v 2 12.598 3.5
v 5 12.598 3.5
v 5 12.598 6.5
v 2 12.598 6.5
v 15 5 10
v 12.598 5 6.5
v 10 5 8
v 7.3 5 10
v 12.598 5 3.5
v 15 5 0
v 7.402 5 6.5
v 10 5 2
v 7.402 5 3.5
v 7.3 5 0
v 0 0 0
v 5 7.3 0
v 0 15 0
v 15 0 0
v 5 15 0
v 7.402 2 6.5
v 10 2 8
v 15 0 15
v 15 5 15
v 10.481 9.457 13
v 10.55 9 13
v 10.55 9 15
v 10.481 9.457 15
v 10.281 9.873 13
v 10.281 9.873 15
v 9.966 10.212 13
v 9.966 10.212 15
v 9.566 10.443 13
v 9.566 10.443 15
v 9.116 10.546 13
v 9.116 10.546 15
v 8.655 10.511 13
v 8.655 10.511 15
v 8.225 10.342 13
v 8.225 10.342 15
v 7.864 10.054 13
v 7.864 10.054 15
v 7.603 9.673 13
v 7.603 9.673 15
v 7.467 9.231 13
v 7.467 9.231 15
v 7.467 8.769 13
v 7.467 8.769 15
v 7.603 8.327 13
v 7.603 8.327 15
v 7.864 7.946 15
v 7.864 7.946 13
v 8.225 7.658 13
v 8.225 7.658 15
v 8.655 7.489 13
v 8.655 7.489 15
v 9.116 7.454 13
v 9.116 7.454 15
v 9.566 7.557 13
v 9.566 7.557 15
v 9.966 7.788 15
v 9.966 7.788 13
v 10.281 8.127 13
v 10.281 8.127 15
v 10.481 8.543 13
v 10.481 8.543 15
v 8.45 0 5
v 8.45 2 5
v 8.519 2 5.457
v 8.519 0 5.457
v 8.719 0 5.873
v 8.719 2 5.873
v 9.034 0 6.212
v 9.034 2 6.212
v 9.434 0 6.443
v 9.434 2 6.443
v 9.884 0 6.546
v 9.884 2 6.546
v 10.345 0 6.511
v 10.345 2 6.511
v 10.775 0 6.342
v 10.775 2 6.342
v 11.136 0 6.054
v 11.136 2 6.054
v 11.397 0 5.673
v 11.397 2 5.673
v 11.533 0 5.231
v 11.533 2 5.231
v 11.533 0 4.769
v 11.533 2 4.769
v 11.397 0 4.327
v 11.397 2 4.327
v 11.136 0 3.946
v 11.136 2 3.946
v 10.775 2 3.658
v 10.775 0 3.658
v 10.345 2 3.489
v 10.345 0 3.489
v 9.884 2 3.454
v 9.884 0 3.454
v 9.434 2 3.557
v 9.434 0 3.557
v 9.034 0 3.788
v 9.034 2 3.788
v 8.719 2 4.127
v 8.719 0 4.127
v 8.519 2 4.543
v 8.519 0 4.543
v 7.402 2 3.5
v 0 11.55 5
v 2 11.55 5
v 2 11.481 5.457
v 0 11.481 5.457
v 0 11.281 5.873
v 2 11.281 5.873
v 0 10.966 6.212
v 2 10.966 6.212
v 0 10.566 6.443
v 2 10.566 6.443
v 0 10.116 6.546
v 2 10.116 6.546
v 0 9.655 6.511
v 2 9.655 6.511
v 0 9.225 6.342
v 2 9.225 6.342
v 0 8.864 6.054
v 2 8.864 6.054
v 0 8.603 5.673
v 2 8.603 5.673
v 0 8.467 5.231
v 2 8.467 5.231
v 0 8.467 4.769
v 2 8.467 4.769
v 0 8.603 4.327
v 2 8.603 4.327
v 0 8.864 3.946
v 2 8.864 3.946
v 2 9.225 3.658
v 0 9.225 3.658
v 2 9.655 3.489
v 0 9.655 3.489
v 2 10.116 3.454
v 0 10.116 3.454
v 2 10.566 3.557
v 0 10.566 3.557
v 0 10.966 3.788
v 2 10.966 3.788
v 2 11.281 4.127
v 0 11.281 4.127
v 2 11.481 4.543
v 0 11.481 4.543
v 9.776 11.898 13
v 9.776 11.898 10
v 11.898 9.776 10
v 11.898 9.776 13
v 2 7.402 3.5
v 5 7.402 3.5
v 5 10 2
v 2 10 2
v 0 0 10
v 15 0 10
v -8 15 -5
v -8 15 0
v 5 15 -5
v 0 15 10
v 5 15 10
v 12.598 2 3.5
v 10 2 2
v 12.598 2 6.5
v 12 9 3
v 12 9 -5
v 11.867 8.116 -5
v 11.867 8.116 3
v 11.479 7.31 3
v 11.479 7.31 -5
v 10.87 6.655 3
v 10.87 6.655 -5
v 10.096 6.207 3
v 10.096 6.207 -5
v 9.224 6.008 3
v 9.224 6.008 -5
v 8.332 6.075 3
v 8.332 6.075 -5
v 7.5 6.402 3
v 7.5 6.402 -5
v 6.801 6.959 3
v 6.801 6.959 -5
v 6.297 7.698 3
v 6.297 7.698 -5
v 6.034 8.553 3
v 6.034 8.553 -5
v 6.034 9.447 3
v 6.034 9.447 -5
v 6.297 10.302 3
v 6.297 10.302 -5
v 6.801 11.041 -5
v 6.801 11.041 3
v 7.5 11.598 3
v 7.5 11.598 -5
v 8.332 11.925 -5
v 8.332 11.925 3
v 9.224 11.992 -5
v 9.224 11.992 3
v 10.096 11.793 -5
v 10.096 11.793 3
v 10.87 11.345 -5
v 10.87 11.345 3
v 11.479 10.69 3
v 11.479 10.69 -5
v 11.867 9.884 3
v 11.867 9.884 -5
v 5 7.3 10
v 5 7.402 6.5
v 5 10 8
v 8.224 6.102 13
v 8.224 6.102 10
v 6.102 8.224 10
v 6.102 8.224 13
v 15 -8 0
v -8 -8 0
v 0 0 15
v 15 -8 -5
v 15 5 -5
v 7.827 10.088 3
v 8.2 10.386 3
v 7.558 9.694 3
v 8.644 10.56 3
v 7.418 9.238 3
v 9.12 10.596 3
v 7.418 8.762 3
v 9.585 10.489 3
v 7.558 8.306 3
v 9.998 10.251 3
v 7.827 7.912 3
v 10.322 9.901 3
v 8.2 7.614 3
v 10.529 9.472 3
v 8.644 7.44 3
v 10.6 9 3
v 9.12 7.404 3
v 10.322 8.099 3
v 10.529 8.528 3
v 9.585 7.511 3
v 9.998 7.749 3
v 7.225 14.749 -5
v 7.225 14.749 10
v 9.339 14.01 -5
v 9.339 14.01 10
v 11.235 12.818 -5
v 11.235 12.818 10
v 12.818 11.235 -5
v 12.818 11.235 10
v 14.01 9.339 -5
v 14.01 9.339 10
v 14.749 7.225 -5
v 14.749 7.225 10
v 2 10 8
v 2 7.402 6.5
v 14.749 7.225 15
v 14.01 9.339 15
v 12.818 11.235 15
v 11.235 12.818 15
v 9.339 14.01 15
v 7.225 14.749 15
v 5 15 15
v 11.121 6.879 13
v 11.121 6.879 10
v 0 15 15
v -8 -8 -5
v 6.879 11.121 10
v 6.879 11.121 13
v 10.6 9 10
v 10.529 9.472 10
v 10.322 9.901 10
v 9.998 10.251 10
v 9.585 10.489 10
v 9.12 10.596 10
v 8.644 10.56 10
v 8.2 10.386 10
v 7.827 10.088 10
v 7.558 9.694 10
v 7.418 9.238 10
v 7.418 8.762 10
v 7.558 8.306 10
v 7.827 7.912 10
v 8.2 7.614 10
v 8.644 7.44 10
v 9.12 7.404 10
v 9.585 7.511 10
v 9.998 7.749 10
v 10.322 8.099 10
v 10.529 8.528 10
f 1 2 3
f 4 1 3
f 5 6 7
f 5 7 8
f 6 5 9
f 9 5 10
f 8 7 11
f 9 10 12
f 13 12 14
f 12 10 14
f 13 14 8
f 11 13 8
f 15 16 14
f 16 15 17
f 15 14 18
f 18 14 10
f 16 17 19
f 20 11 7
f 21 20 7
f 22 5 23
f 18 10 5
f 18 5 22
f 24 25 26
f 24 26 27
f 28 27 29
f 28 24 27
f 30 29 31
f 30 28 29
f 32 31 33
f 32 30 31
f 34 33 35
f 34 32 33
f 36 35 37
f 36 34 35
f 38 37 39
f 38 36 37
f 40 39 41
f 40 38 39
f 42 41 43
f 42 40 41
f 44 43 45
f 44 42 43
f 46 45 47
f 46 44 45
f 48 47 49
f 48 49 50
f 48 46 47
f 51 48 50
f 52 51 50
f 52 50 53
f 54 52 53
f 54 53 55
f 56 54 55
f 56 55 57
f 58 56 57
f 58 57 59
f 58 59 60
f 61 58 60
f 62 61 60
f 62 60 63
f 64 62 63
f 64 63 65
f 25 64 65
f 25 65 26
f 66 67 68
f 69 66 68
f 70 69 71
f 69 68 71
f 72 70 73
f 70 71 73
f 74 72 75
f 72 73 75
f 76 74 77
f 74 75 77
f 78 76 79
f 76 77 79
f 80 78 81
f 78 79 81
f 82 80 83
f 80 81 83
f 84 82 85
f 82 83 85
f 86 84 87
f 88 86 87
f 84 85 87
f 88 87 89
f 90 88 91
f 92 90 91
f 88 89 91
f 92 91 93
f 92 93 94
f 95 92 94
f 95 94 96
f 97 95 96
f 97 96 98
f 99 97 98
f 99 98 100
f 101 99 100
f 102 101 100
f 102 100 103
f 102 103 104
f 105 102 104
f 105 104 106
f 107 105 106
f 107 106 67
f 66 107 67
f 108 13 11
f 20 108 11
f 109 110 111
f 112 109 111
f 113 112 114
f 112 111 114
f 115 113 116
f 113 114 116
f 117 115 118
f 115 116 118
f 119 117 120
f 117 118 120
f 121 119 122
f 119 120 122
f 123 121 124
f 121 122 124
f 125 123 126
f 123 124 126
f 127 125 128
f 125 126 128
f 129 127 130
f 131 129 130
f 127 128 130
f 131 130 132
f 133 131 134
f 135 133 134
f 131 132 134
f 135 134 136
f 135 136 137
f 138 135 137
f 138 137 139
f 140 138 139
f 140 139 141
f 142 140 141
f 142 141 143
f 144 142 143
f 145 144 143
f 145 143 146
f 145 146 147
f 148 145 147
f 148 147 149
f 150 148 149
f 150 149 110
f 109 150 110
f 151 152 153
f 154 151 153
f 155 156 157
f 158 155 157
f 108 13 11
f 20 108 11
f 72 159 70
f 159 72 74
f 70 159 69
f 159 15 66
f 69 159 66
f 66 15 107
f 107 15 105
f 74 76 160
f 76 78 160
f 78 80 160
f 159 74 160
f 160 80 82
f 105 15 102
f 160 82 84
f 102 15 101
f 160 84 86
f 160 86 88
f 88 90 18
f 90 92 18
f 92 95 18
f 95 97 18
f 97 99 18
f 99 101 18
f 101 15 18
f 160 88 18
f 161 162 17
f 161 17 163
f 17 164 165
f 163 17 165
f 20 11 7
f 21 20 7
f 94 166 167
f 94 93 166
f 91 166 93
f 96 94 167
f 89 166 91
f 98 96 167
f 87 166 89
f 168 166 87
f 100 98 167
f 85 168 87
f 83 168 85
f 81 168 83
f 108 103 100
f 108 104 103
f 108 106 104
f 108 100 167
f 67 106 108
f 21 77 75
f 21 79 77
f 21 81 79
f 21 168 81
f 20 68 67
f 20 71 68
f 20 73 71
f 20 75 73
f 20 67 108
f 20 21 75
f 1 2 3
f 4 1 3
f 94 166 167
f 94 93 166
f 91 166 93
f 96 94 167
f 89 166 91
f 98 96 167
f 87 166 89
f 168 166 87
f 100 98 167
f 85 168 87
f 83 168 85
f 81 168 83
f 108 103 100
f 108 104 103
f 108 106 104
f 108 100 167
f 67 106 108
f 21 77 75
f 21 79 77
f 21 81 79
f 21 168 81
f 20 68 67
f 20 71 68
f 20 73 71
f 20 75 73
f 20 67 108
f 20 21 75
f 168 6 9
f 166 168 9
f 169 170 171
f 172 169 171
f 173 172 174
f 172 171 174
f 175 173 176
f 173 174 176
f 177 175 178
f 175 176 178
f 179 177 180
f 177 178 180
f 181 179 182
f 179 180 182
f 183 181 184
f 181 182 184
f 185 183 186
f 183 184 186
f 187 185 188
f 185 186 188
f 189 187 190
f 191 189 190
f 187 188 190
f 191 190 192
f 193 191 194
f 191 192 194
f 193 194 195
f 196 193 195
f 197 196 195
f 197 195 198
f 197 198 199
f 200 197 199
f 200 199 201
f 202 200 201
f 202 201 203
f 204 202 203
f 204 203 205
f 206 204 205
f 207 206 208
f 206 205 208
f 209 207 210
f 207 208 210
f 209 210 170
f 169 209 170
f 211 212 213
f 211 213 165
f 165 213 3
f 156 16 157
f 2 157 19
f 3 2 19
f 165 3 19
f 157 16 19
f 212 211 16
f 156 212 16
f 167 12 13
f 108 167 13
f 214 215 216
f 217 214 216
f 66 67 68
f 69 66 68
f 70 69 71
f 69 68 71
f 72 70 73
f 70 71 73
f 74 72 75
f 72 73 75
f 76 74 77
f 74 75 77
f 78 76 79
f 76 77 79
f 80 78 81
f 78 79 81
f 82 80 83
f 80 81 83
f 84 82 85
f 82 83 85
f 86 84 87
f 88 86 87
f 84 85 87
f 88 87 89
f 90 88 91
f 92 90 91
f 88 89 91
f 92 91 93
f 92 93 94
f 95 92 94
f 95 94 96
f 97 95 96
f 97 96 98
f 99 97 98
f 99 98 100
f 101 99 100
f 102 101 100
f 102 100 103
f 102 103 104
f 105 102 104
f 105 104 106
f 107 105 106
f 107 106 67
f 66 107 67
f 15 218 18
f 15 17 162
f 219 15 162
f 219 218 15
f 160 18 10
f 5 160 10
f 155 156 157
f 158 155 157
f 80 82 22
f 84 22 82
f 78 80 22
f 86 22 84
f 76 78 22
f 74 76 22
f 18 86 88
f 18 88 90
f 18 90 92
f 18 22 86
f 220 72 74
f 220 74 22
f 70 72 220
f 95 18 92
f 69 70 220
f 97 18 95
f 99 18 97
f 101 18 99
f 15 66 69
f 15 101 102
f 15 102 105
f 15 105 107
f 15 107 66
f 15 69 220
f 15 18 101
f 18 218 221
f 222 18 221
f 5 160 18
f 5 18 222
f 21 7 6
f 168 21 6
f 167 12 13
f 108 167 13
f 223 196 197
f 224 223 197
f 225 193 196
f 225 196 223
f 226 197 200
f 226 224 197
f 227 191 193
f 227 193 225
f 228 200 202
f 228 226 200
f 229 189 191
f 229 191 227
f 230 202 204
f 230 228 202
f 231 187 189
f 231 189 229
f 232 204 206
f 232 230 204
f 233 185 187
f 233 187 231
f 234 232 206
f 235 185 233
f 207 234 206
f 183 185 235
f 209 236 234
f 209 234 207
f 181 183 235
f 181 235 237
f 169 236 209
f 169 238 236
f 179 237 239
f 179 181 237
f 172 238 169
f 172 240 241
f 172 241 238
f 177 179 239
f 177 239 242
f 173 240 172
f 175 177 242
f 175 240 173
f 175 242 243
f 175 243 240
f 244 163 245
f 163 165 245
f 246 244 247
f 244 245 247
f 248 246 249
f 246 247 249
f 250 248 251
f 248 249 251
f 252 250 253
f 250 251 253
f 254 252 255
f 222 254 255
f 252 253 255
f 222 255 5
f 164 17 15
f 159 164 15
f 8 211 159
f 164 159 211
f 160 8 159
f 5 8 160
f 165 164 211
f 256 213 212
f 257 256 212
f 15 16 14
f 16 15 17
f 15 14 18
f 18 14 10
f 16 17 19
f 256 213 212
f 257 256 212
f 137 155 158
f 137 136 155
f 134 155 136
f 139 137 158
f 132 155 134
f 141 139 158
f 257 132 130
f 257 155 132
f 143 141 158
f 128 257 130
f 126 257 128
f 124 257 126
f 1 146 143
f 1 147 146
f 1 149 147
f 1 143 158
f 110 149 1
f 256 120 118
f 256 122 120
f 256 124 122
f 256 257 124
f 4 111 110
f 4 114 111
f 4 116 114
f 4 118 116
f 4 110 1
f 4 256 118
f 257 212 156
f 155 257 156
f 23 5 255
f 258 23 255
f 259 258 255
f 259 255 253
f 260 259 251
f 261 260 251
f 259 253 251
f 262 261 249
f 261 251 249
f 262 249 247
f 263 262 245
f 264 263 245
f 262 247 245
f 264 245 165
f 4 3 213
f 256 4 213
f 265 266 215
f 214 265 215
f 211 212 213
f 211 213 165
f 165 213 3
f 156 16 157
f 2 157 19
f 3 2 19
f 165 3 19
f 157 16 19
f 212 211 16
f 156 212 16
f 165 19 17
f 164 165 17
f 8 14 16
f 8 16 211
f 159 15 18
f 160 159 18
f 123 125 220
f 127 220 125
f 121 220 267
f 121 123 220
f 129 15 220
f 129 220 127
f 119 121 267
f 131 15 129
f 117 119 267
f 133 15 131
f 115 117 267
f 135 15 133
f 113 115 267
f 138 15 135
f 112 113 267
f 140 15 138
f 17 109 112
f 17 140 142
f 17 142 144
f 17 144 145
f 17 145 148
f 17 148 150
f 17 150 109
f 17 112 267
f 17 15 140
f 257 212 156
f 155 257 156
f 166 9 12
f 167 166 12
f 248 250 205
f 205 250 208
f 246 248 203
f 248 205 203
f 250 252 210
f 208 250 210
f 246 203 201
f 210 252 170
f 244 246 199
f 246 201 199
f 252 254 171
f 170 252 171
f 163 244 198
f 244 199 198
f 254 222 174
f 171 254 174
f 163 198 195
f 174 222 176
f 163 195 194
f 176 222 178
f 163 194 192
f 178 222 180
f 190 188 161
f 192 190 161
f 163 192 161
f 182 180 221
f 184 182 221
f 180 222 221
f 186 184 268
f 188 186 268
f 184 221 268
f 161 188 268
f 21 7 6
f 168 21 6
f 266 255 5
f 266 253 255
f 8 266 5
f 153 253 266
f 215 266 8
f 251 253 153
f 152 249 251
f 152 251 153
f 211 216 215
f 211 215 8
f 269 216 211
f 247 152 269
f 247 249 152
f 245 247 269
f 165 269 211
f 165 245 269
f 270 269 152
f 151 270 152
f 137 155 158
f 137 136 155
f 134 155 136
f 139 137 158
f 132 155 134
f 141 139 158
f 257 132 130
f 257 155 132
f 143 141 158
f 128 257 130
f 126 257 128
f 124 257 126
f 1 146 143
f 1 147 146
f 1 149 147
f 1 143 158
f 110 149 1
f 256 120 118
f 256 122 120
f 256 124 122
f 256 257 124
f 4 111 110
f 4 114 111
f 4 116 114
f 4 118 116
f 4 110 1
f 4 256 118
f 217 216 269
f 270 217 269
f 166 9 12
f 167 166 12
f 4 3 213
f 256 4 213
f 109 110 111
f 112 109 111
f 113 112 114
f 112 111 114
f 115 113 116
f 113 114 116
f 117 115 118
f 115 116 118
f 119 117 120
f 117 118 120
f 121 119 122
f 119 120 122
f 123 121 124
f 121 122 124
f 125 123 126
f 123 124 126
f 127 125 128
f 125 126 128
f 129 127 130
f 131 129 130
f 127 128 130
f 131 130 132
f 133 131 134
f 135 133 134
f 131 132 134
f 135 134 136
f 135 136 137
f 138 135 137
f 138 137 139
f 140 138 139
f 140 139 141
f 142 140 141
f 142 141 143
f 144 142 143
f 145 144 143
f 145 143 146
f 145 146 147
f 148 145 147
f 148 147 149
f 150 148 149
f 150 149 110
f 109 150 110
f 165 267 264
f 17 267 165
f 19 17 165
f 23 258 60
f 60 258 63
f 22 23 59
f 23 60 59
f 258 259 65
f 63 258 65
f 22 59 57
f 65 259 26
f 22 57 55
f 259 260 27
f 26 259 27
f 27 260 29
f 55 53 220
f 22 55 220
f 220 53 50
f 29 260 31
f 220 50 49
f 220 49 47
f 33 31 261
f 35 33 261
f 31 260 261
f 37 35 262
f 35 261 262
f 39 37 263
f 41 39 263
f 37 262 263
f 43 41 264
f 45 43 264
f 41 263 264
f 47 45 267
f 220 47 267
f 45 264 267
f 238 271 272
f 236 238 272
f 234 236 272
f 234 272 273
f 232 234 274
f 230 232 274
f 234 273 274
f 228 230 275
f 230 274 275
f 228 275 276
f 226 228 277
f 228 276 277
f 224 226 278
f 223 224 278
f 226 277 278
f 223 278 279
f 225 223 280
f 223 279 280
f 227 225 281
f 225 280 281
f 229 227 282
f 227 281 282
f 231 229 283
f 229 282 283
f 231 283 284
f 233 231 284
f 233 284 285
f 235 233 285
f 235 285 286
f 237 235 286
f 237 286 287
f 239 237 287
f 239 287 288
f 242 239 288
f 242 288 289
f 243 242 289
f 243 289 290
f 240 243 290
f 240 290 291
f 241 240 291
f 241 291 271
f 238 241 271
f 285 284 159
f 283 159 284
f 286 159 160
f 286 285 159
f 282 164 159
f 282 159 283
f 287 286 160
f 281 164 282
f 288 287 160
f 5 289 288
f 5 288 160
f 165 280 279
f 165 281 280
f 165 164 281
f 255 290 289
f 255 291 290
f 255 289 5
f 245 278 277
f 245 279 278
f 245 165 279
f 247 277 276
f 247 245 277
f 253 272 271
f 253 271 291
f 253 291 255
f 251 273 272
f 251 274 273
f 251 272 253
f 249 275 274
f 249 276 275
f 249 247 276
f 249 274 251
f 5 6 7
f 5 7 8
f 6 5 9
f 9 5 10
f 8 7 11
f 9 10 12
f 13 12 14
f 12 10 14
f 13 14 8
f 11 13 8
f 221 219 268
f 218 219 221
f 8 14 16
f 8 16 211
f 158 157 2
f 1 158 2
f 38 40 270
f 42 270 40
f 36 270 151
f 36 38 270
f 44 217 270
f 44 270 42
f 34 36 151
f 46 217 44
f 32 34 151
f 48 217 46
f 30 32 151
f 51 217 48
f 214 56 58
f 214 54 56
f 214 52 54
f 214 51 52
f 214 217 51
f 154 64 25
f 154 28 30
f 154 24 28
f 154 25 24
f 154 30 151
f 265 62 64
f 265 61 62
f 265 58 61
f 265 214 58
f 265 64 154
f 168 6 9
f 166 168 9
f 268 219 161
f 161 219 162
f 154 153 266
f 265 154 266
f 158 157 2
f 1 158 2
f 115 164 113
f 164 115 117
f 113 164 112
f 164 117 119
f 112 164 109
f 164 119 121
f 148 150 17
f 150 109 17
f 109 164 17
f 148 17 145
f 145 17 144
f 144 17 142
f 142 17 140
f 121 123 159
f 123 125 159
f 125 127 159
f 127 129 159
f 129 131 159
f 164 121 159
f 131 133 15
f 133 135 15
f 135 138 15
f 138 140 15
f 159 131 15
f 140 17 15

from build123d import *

# Parameters (mm, degrees)
PAD_DEPTH       = 10
SKETCH001_R     = 1.55
POCKET_DEPTH    = 5
SKETCH002_R     = 1.55
POCKET001_DEPTH = 5
POCKET002_DEPTH = 3
POCKET003_DEPTH = 3
CHAMFER_SIZE    = 2.3
PAD001_DEPTH    = 10
SKETCH006_R     = 1.55
POCKET007_DEPTH = 5
SKETCH009_R     = 1.55
POCKET005_DEPTH = 5
POCKET006_DEPTH = 3
POCKET004_DEPTH = 3
CHAMFER001_SIZE = 2.3
SKETCH010_R     = 1.55
PAD002_DEPTH    = 5
POCKET008_DEPTH = 3
PAD003_DEPTH    = 10
PAD004_DEPTH    = 5
SKETCH014_R     = 1.6
POCKET009_DEPTH = 20
SKETCH015_R     = 3
POCKET010_DEPTH = 8


with BuildPart() as body:
    # Sketch → Pad (new body)
    with BuildSketch(Plane.XY):
        Polygon((0, 15), (0, 0), (15, 0), (15, 5), (5, 5), (5, 15), align=None)
    extrude(amount=PAD_DEPTH)

    # Sketch001 (on Face4 of Pad) → Pocket (cut)
    with BuildSketch(Plane(origin=(0, 5, 0), x_dir=(-1, 0, 0), z_dir=(0, 1, 0))):
        with Locations((-10, 5)):
            Circle(SKETCH001_R)
    extrude(amount=-POCKET_DEPTH, mode=Mode.SUBTRACT)

    # Sketch002 (on Face6 of Pocket) → Pocket001 (cut)
    with BuildSketch(Plane.YZ.offset(5)):
        with Locations((10, 5)):
            Circle(SKETCH002_R)
    extrude(amount=-POCKET001_DEPTH, mode=Mode.SUBTRACT)

    # Sketch003 (on Face7 of Pocket001) → Pocket002 (cut)
    with BuildSketch(Plane.YZ.offset(5)):
        Polygon((10, 2), (12.598076, 3.5), (12.598076, 6.5), (10, 8), (7.401924, 6.5), (7.401924, 3.5), align=None)
    extrude(amount=-POCKET002_DEPTH, mode=Mode.SUBTRACT)

    # Sketch004 (on Face9 of Pocket002) → Pocket003 (cut)
    with BuildSketch(Plane(origin=(0, 5, 0), x_dir=(-1, 0, 0), z_dir=(0, 1, 0))):
        Polygon((-7.401924, 3.5), (-7.401924, 6.5), (-10, 8), (-12.598076, 6.5), (-12.598076, 3.5), (-10, 2), align=None)
    extrude(amount=-POCKET003_DEPTH, mode=Mode.SUBTRACT)

    # Chamfer
    chamfer_edges = [body.edges().sort_by_distance(p)[0] for p in [
        (5, 5, 5),
    ]]
    chamfer(chamfer_edges, length=CHAMFER_SIZE)


with BuildPart() as body001:
    # Sketch008 → Pad001 (new body)
    with BuildSketch(Plane.XY):
        Polygon((0, 15), (0, 0), (15, 0), (15, 5), (5, 5), (5, 15), align=None)
    extrude(amount=PAD001_DEPTH)

    # Sketch006 (on Face4 of Pad001) → Pocket007 (cut)
    with BuildSketch(Plane(origin=(0, 5, 0), x_dir=(-1, 0, 0), z_dir=(0, 1, 0))):
        with Locations((-10, 5)):
            Circle(SKETCH006_R)
    extrude(amount=-POCKET007_DEPTH, mode=Mode.SUBTRACT)

    # Sketch009 (on Face6 of Pocket007) → Pocket005 (cut)
    with BuildSketch(Plane.YZ.offset(5)):
        with Locations((10, 5)):
            Circle(SKETCH009_R)
    extrude(amount=-POCKET005_DEPTH, mode=Mode.SUBTRACT)

    # Sketch005 (on Face7 of Pocket005) → Pocket006 (cut)
    with BuildSketch(Plane.YZ.offset(5)):
        Polygon((10, 2), (12.598076, 3.5), (12.598076, 6.5), (10, 8), (7.401924, 6.5), (7.401924, 3.5), align=None)
    extrude(amount=-POCKET006_DEPTH, mode=Mode.SUBTRACT)

    # Sketch007 (on Face9 of Pocket006) → Pocket004 (cut)
    with BuildSketch(Plane(origin=(0, 5, 0), x_dir=(-1, 0, 0), z_dir=(0, 1, 0))):
        Polygon((-7.401924, 3.5), (-7.401924, 6.5), (-10, 8), (-12.598076, 6.5), (-12.598076, 3.5), (-10, 2), align=None)
    extrude(amount=-POCKET004_DEPTH, mode=Mode.SUBTRACT)

    # Chamfer001
    chamfer001_edges = [body001.edges().sort_by_distance(p)[0] for p in [
        (5, 5, 5),
    ]]
    chamfer(chamfer001_edges, length=CHAMFER001_SIZE)

    # Sketch010 (on Face9 of Chamfer001) → Pad002 (join)
    with BuildSketch(Plane.XY.offset(10)):
        with BuildLine():
            Line((0, 0), (0, 15))
            Line((0, 15), (5, 15))
            ThreePointArc((15, 5), (12.071068, 12.071068), (5, 15))
            Line((15, 5), (15, 0))
            Line((15, 0), (0, 0))
        make_face()
        with Locations((9, 9)):
            Circle(SKETCH010_R, mode=Mode.SUBTRACT)
    extrude(amount=PAD002_DEPTH)

    # Sketch011 (on Face9 of Pad002) → Pocket008 (cut)
    with BuildSketch(Plane(origin=(0, 0, 10), x_dir=(1, 0, 0), z_dir=(0, 0, -1))):
        Polygon((9.776457, -11.897777), (11.897777, -9.776457), (11.12132, -6.87868), (8.223543, -6.102223), (6.102223, -8.223543), (6.87868, -11.12132), align=None)
    extrude(amount=-POCKET008_DEPTH, mode=Mode.SUBTRACT)


with BuildPart() as body002:
    # Sketch012 → Pad003 (new body)
    with BuildSketch(Plane.XY):
        with BuildLine():
            Line((0, 15), (0, 0))
            Line((0, 0), (15, 0))
            Line((15, 0), (15, 5))
            ThreePointArc((15, 5), (12.071068, 12.071068), (5, 15))
            Line((5, 15), (0, 15))
        make_face()
    extrude(amount=PAD003_DEPTH)

    # Sketch013 (on Face6 of Pad003) → Pad004 (join)
    with BuildSketch(Plane(origin=(0, 0, 0), x_dir=(1, 0, 0), z_dir=(0, 0, -1))):
        with BuildLine():
            Line((-8, 8), (15, 8))
            Line((15, 8), (15, -5))
            ThreePointArc((5, -15), (12.071068, -12.071068), (15, -5))
            Line((-8, -15), (5, -15))
            Line((-8, 8), (-8, -15))
        make_face()
    extrude(amount=PAD004_DEPTH)

    # Sketch014 (on Face5 of Pad004) → Pocket009 (cut)
    with BuildSketch(Plane.XY.offset(10)):
        with Locations((9, 9)):
            Circle(SKETCH014_R)
    extrude(amount=-POCKET009_DEPTH, mode=Mode.SUBTRACT)

    # Sketch015 (on Face14 of Pocket009) → Pocket010 (cut)
    with BuildSketch(Plane(origin=(0, 0, -5), x_dir=(1, 0, 0), z_dir=(0, 0, -1))):
        with Locations((9, -9)):
            Circle(SKETCH015_R)
    extrude(amount=-POCKET010_DEPTH, mode=Mode.SUBTRACT)


solid = Compound([body.part, body001.part, body002.part])
